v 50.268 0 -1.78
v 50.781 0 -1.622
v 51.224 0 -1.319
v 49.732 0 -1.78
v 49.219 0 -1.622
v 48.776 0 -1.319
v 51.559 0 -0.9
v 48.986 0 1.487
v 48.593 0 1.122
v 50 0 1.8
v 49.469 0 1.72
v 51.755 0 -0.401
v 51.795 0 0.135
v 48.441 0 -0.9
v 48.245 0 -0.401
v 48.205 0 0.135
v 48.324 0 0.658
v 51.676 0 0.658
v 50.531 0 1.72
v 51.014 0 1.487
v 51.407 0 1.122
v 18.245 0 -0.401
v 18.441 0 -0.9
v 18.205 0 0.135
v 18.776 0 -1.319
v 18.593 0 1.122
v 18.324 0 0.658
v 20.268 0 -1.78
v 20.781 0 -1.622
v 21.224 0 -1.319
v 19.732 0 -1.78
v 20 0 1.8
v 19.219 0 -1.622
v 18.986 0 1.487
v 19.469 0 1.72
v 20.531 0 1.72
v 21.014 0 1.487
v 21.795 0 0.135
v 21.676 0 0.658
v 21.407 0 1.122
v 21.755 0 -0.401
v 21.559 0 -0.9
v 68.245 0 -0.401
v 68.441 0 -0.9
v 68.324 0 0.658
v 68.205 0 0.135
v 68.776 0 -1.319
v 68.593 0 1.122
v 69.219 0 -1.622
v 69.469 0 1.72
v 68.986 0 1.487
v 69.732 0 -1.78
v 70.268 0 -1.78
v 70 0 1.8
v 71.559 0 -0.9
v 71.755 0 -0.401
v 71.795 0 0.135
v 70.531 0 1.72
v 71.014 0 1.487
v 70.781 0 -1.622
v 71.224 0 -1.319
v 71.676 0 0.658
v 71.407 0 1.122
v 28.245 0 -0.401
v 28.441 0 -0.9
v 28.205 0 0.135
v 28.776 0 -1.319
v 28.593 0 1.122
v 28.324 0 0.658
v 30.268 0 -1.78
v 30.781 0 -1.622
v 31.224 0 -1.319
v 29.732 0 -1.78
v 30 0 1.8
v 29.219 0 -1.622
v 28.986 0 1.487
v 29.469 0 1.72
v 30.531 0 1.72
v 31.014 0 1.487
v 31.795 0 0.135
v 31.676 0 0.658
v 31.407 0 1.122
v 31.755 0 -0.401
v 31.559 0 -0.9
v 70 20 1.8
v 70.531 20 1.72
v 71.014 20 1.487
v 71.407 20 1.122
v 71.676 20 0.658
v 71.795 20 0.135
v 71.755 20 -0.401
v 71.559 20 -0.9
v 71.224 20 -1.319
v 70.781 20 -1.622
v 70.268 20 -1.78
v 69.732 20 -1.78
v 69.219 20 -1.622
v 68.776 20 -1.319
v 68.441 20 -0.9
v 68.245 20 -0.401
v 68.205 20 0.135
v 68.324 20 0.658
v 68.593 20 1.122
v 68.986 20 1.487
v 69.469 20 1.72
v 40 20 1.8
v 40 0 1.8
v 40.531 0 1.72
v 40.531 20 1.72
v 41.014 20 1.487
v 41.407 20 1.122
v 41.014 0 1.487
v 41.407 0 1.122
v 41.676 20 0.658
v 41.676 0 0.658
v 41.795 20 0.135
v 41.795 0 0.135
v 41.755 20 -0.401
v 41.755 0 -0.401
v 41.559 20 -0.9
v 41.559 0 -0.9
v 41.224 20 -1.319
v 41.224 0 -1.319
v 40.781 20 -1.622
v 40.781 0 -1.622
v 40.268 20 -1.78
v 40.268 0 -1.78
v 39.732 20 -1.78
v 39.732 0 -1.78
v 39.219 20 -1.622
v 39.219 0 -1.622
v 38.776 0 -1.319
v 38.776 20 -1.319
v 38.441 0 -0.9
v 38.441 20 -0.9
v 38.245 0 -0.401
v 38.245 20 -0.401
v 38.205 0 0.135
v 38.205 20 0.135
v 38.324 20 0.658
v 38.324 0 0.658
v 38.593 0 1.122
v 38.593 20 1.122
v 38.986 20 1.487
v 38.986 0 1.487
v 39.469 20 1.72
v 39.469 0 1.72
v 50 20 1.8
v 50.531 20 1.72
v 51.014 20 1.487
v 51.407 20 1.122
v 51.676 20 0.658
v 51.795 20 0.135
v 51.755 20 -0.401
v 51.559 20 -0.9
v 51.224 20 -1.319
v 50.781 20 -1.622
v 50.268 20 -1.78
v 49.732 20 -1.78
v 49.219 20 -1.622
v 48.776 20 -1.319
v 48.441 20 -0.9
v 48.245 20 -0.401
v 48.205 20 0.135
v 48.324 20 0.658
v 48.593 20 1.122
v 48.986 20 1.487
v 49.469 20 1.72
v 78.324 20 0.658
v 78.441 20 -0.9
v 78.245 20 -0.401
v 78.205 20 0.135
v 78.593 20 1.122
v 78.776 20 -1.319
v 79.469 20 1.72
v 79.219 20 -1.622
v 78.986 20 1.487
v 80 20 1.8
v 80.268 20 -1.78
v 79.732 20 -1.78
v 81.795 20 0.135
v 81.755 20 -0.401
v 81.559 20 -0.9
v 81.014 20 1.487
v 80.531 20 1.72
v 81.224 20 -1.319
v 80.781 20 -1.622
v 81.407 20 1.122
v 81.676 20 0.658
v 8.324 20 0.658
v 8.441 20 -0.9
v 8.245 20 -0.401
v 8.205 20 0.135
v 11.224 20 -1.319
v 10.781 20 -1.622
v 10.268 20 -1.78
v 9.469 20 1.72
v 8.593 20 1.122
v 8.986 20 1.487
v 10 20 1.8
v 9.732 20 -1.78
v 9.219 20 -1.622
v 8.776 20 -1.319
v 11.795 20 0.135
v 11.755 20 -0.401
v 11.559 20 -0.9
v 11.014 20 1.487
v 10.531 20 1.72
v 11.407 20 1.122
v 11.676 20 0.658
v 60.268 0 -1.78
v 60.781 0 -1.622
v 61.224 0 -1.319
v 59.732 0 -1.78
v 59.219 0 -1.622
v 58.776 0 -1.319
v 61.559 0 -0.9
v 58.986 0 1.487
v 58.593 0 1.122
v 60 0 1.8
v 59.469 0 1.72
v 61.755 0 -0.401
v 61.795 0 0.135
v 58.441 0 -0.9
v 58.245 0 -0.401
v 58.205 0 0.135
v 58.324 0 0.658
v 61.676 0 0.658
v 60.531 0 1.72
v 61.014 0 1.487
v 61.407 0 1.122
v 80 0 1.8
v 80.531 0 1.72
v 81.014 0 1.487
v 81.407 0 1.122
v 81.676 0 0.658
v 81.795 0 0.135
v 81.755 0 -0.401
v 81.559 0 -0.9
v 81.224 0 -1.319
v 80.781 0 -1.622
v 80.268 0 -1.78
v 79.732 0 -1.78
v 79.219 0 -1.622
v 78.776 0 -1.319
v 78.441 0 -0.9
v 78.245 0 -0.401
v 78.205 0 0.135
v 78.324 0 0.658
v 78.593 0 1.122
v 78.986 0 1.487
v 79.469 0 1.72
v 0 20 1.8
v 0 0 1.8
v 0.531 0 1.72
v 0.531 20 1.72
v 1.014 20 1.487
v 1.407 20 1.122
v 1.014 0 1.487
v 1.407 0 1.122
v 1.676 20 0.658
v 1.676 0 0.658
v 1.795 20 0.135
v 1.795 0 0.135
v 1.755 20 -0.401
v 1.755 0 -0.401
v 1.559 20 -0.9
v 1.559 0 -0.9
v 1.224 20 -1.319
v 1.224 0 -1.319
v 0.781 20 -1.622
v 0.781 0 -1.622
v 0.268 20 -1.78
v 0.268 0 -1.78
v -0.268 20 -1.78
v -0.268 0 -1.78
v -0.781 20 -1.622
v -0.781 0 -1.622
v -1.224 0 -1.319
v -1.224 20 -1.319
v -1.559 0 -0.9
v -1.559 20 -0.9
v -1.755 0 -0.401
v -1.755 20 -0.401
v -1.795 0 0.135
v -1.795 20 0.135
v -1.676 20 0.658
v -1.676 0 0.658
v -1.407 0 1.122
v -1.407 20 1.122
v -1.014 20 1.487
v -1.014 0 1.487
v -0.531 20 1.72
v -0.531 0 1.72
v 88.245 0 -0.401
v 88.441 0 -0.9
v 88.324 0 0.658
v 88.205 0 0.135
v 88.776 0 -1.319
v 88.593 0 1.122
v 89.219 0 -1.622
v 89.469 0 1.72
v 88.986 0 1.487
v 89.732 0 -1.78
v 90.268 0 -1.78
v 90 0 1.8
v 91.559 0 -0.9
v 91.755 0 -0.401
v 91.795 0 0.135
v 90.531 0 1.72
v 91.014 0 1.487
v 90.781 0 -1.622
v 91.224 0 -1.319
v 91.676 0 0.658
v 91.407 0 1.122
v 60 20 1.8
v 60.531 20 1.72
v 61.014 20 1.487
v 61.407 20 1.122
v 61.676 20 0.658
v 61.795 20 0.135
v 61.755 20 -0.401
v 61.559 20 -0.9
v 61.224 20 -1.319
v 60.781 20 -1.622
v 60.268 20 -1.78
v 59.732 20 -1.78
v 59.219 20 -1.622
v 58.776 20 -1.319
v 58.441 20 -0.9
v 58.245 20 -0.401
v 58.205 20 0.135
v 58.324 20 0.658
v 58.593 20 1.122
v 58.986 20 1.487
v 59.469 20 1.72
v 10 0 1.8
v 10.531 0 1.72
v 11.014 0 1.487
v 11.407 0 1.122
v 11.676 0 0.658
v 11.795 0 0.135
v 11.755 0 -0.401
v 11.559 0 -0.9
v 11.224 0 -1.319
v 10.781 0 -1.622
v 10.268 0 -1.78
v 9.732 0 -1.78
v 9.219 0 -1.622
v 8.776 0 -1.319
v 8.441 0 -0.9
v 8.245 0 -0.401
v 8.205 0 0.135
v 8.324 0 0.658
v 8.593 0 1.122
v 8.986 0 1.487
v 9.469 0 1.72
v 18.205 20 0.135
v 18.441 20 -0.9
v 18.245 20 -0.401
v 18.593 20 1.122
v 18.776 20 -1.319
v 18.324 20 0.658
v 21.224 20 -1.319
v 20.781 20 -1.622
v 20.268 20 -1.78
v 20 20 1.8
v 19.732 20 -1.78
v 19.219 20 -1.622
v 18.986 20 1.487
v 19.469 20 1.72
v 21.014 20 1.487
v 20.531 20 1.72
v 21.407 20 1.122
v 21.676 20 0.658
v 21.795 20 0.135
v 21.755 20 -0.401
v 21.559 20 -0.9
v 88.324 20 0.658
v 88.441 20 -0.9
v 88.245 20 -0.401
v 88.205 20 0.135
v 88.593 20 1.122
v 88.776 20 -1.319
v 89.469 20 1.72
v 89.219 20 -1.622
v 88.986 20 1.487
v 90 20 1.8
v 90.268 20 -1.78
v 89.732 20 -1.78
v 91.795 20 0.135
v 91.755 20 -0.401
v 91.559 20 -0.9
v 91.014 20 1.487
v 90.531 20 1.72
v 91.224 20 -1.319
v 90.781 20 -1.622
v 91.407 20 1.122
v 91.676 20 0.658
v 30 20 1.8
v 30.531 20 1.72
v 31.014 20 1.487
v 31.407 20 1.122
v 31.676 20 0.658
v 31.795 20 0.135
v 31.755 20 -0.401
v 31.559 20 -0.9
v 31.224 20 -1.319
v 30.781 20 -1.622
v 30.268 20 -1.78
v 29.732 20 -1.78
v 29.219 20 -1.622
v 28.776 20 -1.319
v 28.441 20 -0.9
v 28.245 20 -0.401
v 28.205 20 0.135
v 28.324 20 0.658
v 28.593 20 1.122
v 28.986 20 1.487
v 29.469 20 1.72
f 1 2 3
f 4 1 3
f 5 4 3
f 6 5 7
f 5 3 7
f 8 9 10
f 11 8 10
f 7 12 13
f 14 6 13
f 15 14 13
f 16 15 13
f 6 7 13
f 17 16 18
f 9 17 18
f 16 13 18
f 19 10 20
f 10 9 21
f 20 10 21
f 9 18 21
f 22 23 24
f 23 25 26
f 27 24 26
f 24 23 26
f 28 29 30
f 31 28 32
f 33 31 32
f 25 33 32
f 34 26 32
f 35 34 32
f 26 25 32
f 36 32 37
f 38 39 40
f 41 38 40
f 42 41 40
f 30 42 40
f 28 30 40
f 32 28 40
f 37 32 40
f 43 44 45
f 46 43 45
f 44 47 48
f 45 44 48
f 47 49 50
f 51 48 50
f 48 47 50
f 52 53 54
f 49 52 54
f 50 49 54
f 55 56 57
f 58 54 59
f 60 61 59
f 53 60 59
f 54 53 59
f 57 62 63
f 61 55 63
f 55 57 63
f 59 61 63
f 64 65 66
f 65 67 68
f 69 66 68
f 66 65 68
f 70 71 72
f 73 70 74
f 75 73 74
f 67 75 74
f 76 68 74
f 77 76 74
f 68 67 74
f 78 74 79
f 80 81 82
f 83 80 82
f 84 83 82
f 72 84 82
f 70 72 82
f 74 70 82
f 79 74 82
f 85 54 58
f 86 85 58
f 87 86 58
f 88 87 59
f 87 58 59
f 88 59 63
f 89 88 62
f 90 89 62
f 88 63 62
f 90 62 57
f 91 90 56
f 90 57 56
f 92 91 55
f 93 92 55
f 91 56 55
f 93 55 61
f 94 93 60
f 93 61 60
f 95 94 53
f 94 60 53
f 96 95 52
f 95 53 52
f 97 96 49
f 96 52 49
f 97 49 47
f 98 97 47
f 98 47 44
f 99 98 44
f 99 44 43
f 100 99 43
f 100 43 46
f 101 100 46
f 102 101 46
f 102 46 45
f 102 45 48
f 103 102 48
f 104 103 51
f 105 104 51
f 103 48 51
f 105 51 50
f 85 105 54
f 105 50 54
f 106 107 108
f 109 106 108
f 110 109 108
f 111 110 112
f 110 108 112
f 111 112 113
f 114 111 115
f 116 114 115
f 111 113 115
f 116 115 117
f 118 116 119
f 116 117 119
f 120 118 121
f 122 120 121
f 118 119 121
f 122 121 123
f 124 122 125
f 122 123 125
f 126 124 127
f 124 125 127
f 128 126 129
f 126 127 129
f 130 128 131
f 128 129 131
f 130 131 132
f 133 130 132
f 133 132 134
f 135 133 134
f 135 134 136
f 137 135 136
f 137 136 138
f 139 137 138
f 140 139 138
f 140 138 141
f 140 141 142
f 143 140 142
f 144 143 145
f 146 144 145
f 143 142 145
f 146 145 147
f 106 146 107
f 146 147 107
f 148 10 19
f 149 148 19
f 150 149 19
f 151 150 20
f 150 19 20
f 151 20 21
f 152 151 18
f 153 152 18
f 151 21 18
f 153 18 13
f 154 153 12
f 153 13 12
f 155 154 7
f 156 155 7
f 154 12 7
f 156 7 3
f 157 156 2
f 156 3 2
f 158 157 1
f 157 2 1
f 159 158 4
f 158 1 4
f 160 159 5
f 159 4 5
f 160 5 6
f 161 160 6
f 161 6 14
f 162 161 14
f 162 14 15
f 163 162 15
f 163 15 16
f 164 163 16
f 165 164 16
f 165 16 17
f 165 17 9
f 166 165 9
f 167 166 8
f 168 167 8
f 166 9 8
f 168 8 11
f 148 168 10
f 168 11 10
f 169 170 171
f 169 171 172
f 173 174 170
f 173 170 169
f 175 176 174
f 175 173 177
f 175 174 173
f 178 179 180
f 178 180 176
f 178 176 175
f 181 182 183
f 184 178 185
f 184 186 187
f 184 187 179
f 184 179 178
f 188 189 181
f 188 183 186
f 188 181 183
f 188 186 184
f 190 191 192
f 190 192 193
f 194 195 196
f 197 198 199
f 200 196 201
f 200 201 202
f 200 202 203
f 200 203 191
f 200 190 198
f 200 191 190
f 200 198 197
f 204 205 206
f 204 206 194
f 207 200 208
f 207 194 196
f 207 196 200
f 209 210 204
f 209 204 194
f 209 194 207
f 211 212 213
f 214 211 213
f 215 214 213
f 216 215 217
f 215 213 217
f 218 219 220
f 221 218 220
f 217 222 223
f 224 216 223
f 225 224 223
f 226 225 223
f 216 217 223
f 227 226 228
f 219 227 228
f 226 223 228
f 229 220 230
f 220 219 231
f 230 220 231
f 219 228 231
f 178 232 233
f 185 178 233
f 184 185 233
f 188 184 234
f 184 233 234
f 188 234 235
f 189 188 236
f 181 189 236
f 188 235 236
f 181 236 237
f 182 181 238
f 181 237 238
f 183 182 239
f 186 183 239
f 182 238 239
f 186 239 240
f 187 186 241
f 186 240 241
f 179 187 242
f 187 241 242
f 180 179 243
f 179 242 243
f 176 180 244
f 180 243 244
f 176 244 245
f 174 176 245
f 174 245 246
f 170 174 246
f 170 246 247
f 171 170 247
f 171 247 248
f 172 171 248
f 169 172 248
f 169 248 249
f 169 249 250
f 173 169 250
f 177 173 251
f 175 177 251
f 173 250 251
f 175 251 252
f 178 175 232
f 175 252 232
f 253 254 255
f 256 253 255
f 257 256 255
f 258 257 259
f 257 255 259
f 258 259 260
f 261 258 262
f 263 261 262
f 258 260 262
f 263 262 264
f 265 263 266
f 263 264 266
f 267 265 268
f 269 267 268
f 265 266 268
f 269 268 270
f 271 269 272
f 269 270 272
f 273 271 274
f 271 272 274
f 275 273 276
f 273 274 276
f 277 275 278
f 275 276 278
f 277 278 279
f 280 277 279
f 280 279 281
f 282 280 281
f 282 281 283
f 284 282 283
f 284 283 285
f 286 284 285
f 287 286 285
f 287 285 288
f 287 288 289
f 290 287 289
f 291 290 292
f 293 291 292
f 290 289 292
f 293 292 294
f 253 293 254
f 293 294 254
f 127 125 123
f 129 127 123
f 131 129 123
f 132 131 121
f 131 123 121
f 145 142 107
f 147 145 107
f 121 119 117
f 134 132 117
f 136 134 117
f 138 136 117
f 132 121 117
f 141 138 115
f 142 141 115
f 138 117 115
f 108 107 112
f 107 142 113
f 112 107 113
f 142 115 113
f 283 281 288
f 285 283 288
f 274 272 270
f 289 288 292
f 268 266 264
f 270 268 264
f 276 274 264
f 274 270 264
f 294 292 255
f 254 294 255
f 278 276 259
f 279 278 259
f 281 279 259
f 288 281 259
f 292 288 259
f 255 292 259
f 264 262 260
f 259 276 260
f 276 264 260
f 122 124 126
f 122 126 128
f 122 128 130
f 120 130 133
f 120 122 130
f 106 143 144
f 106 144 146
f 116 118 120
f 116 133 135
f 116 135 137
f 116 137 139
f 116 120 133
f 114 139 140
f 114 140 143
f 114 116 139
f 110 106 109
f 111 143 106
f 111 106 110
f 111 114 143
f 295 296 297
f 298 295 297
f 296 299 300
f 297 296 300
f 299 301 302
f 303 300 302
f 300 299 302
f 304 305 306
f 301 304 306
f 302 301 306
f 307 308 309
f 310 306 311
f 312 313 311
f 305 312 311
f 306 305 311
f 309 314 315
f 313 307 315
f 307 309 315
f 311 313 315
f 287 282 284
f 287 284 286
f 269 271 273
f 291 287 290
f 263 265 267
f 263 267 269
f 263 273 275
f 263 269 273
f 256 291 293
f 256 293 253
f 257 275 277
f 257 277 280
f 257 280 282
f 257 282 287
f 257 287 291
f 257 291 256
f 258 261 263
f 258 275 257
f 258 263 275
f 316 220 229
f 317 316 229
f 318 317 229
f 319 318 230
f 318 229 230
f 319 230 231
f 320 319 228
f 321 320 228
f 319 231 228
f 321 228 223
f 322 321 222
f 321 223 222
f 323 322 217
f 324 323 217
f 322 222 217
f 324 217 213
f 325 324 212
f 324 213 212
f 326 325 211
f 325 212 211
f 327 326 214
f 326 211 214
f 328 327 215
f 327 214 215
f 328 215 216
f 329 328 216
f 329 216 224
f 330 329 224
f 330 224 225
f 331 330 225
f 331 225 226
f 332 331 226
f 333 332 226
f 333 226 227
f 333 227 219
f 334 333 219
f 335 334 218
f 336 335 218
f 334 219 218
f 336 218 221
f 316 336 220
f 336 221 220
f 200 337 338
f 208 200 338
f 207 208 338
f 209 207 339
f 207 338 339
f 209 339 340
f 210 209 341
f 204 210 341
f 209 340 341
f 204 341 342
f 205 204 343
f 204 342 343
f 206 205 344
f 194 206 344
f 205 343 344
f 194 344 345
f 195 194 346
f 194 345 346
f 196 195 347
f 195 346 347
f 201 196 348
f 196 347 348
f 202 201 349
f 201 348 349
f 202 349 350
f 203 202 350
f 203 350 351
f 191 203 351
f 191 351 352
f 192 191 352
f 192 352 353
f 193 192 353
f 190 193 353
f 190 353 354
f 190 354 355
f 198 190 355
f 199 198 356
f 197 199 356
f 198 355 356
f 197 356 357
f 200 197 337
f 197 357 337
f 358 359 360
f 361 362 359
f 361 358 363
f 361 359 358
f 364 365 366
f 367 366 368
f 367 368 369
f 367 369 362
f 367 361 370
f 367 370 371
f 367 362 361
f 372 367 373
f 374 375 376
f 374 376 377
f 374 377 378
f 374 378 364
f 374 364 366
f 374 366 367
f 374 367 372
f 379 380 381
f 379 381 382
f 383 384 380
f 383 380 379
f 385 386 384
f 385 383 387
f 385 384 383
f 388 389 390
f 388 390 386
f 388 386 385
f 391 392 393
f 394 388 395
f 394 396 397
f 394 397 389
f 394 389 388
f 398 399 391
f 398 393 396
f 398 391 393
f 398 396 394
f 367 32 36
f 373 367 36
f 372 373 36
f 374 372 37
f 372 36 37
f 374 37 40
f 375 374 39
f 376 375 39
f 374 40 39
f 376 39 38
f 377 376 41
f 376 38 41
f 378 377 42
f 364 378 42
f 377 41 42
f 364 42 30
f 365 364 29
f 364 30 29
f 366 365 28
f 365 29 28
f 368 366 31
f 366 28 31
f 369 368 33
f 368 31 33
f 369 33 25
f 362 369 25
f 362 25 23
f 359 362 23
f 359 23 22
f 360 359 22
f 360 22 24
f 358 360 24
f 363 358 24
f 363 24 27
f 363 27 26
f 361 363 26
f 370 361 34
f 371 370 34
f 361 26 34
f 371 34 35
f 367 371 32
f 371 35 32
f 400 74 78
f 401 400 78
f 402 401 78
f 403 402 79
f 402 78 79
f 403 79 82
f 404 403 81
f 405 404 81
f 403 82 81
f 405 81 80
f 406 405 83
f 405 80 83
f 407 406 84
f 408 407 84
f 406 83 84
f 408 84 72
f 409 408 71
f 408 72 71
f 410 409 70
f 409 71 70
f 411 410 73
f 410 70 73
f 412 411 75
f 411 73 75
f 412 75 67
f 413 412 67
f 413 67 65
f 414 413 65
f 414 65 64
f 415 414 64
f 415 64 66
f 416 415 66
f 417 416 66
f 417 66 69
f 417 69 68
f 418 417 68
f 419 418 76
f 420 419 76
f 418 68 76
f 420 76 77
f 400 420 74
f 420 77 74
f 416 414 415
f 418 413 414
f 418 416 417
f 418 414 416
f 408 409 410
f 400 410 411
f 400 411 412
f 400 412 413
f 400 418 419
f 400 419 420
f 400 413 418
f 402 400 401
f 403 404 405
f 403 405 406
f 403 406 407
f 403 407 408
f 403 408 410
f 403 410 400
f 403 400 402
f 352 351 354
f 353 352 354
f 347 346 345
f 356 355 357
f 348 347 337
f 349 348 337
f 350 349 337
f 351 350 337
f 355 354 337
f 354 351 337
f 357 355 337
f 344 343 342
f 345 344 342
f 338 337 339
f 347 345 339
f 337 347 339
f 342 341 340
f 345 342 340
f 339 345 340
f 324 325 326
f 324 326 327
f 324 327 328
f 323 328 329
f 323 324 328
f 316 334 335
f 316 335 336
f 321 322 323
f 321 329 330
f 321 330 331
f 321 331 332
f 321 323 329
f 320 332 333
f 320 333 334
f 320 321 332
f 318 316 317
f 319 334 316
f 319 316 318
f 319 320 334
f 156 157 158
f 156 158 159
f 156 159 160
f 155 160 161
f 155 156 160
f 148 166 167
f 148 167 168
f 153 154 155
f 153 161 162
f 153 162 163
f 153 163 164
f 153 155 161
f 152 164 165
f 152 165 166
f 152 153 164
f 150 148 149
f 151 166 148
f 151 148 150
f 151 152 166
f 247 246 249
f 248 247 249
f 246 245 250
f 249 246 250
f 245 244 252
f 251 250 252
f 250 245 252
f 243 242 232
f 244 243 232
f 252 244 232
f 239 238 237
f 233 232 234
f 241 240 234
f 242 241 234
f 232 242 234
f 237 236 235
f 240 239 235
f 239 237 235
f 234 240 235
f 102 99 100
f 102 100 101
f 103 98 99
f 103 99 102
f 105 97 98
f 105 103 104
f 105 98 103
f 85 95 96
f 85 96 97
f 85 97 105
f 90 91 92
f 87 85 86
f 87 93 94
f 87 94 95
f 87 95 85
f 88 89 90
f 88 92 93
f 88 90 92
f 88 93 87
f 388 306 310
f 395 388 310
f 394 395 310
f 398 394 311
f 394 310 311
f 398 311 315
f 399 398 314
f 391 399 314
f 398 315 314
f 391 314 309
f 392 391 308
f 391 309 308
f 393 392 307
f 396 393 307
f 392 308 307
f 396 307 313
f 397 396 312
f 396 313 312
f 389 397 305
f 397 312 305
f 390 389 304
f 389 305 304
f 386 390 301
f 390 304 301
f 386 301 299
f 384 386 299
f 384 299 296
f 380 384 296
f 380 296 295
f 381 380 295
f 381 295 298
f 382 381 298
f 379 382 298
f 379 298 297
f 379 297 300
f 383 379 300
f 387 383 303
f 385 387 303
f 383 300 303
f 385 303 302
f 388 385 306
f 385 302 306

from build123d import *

# Parameters (mm, degrees)
SKETCH_1_R         = 1.8
EXTRUDE_1_DEPTH    = 20
EXTRUDE_1_2_DEPTH  = 20
EXTRUDE_1_3_DEPTH  = 20
EXTRUDE_1_4_DEPTH  = 20
EXTRUDE_1_5_DEPTH  = 20
EXTRUDE_1_6_DEPTH  = 20
EXTRUDE_1_7_DEPTH  = 20
EXTRUDE_1_8_DEPTH  = 20
EXTRUDE_1_9_DEPTH  = 20
EXTRUDE_1_10_DEPTH = 20


with BuildPart() as part:
    # 草图1 → 凸台-拉伸1 (new body)
    with BuildSketch(Plane(origin=(0, 0, 0), x_dir=(1, 0, 0), z_dir=(0, 1, 0))):
        with Locations(Location((0, 0, 0), (0, 0, 270))):
            Circle(SKETCH_1_R)
    extrude(amount=EXTRUDE_1_DEPTH)


with BuildPart() as body_2:
    # 草图1 → Extrude 1 2 (new body)
    with BuildSketch(Plane(origin=(0, 0, 0), x_dir=(1, 0, 0), z_dir=(0, 1, 0))):
        with Locations(Location((10, 0, 0), (0, 0, 270))):
            Circle(SKETCH_1_R)
    extrude(amount=EXTRUDE_1_2_DEPTH)


with BuildPart() as body_3:
    # 草图1 → Extrude 1 3 (new body)
    with BuildSketch(Plane(origin=(0, 0, 0), x_dir=(1, 0, 0), z_dir=(0, 1, 0))):
        with Locations(Location((20, 0, 0), (0, 0, 270))):
            Circle(SKETCH_1_R)
    extrude(amount=EXTRUDE_1_3_DEPTH)


with BuildPart() as body_4:
    # 草图1 → Extrude 1 4 (new body)
    with BuildSketch(Plane(origin=(0, 0, 0), x_dir=(1, 0, 0), z_dir=(0, 1, 0))):
        with Locations(Location((30, 0, 0), (0, 0, 270))):
            Circle(SKETCH_1_R)
    extrude(amount=EXTRUDE_1_4_DEPTH)


with BuildPart() as body_5:
    # 草图1 → Extrude 1 5 (new body)
    with BuildSketch(Plane(origin=(0, 0, 0), x_dir=(1, 0, 0), z_dir=(0, 1, 0))):
        with Locations(Location((40, 0, 0), (0, 0, 270))):
            Circle(SKETCH_1_R)
    extrude(amount=EXTRUDE_1_5_DEPTH)


with BuildPart() as body_6:
    # 草图1 → Extrude 1 6 (new body)
    with BuildSketch(Plane(origin=(0, 0, 0), x_dir=(1, 0, 0), z_dir=(0, 1, 0))):
        with Locations(Location((50, 0, 0), (0, 0, 270))):
            Circle(SKETCH_1_R)
    extrude(amount=EXTRUDE_1_6_DEPTH)


with BuildPart() as body_7:
    # 草图1 → Extrude 1 7 (new body)
    with BuildSketch(Plane(origin=(0, 0, 0), x_dir=(1, 0, 0), z_dir=(0, 1, 0))):
        with Locations(Location((60, 0, 0), (0, 0, 270))):
            Circle(SKETCH_1_R)
    extrude(amount=EXTRUDE_1_7_DEPTH)


with BuildPart() as body_8:
    # 草图1 → Extrude 1 8 (new body)
    with BuildSketch(Plane(origin=(0, 0, 0), x_dir=(1, 0, 0), z_dir=(0, 1, 0))):
        with Locations(Location((70, 0, 0), (0, 0, 270))):
            Circle(SKETCH_1_R)
    extrude(amount=EXTRUDE_1_8_DEPTH)


with BuildPart() as body_9:
    # 草图1 → Extrude 1 9 (new body)
    with BuildSketch(Plane(origin=(0, 0, 0), x_dir=(1, 0, 0), z_dir=(0, 1, 0))):
        with Locations(Location((80, 0, 0), (0, 0, 270))):
            Circle(SKETCH_1_R)
    extrude(amount=EXTRUDE_1_9_DEPTH)


with BuildPart() as body_10:
    # 草图1 → Extrude 1 10 (new body)
    with BuildSketch(Plane(origin=(0, 0, 0), x_dir=(1, 0, 0), z_dir=(0, 1, 0))):
        with Locations(Location((90, 0, 0), (0, 0, 270))):
            Circle(SKETCH_1_R)
    extrude(amount=EXTRUDE_1_10_DEPTH)


solid = Compound([part.part, body_2.part, body_3.part, body_4.part, body_5.part, body_6.part, body_7.part, body_8.part, body_9.part, body_10.part])
